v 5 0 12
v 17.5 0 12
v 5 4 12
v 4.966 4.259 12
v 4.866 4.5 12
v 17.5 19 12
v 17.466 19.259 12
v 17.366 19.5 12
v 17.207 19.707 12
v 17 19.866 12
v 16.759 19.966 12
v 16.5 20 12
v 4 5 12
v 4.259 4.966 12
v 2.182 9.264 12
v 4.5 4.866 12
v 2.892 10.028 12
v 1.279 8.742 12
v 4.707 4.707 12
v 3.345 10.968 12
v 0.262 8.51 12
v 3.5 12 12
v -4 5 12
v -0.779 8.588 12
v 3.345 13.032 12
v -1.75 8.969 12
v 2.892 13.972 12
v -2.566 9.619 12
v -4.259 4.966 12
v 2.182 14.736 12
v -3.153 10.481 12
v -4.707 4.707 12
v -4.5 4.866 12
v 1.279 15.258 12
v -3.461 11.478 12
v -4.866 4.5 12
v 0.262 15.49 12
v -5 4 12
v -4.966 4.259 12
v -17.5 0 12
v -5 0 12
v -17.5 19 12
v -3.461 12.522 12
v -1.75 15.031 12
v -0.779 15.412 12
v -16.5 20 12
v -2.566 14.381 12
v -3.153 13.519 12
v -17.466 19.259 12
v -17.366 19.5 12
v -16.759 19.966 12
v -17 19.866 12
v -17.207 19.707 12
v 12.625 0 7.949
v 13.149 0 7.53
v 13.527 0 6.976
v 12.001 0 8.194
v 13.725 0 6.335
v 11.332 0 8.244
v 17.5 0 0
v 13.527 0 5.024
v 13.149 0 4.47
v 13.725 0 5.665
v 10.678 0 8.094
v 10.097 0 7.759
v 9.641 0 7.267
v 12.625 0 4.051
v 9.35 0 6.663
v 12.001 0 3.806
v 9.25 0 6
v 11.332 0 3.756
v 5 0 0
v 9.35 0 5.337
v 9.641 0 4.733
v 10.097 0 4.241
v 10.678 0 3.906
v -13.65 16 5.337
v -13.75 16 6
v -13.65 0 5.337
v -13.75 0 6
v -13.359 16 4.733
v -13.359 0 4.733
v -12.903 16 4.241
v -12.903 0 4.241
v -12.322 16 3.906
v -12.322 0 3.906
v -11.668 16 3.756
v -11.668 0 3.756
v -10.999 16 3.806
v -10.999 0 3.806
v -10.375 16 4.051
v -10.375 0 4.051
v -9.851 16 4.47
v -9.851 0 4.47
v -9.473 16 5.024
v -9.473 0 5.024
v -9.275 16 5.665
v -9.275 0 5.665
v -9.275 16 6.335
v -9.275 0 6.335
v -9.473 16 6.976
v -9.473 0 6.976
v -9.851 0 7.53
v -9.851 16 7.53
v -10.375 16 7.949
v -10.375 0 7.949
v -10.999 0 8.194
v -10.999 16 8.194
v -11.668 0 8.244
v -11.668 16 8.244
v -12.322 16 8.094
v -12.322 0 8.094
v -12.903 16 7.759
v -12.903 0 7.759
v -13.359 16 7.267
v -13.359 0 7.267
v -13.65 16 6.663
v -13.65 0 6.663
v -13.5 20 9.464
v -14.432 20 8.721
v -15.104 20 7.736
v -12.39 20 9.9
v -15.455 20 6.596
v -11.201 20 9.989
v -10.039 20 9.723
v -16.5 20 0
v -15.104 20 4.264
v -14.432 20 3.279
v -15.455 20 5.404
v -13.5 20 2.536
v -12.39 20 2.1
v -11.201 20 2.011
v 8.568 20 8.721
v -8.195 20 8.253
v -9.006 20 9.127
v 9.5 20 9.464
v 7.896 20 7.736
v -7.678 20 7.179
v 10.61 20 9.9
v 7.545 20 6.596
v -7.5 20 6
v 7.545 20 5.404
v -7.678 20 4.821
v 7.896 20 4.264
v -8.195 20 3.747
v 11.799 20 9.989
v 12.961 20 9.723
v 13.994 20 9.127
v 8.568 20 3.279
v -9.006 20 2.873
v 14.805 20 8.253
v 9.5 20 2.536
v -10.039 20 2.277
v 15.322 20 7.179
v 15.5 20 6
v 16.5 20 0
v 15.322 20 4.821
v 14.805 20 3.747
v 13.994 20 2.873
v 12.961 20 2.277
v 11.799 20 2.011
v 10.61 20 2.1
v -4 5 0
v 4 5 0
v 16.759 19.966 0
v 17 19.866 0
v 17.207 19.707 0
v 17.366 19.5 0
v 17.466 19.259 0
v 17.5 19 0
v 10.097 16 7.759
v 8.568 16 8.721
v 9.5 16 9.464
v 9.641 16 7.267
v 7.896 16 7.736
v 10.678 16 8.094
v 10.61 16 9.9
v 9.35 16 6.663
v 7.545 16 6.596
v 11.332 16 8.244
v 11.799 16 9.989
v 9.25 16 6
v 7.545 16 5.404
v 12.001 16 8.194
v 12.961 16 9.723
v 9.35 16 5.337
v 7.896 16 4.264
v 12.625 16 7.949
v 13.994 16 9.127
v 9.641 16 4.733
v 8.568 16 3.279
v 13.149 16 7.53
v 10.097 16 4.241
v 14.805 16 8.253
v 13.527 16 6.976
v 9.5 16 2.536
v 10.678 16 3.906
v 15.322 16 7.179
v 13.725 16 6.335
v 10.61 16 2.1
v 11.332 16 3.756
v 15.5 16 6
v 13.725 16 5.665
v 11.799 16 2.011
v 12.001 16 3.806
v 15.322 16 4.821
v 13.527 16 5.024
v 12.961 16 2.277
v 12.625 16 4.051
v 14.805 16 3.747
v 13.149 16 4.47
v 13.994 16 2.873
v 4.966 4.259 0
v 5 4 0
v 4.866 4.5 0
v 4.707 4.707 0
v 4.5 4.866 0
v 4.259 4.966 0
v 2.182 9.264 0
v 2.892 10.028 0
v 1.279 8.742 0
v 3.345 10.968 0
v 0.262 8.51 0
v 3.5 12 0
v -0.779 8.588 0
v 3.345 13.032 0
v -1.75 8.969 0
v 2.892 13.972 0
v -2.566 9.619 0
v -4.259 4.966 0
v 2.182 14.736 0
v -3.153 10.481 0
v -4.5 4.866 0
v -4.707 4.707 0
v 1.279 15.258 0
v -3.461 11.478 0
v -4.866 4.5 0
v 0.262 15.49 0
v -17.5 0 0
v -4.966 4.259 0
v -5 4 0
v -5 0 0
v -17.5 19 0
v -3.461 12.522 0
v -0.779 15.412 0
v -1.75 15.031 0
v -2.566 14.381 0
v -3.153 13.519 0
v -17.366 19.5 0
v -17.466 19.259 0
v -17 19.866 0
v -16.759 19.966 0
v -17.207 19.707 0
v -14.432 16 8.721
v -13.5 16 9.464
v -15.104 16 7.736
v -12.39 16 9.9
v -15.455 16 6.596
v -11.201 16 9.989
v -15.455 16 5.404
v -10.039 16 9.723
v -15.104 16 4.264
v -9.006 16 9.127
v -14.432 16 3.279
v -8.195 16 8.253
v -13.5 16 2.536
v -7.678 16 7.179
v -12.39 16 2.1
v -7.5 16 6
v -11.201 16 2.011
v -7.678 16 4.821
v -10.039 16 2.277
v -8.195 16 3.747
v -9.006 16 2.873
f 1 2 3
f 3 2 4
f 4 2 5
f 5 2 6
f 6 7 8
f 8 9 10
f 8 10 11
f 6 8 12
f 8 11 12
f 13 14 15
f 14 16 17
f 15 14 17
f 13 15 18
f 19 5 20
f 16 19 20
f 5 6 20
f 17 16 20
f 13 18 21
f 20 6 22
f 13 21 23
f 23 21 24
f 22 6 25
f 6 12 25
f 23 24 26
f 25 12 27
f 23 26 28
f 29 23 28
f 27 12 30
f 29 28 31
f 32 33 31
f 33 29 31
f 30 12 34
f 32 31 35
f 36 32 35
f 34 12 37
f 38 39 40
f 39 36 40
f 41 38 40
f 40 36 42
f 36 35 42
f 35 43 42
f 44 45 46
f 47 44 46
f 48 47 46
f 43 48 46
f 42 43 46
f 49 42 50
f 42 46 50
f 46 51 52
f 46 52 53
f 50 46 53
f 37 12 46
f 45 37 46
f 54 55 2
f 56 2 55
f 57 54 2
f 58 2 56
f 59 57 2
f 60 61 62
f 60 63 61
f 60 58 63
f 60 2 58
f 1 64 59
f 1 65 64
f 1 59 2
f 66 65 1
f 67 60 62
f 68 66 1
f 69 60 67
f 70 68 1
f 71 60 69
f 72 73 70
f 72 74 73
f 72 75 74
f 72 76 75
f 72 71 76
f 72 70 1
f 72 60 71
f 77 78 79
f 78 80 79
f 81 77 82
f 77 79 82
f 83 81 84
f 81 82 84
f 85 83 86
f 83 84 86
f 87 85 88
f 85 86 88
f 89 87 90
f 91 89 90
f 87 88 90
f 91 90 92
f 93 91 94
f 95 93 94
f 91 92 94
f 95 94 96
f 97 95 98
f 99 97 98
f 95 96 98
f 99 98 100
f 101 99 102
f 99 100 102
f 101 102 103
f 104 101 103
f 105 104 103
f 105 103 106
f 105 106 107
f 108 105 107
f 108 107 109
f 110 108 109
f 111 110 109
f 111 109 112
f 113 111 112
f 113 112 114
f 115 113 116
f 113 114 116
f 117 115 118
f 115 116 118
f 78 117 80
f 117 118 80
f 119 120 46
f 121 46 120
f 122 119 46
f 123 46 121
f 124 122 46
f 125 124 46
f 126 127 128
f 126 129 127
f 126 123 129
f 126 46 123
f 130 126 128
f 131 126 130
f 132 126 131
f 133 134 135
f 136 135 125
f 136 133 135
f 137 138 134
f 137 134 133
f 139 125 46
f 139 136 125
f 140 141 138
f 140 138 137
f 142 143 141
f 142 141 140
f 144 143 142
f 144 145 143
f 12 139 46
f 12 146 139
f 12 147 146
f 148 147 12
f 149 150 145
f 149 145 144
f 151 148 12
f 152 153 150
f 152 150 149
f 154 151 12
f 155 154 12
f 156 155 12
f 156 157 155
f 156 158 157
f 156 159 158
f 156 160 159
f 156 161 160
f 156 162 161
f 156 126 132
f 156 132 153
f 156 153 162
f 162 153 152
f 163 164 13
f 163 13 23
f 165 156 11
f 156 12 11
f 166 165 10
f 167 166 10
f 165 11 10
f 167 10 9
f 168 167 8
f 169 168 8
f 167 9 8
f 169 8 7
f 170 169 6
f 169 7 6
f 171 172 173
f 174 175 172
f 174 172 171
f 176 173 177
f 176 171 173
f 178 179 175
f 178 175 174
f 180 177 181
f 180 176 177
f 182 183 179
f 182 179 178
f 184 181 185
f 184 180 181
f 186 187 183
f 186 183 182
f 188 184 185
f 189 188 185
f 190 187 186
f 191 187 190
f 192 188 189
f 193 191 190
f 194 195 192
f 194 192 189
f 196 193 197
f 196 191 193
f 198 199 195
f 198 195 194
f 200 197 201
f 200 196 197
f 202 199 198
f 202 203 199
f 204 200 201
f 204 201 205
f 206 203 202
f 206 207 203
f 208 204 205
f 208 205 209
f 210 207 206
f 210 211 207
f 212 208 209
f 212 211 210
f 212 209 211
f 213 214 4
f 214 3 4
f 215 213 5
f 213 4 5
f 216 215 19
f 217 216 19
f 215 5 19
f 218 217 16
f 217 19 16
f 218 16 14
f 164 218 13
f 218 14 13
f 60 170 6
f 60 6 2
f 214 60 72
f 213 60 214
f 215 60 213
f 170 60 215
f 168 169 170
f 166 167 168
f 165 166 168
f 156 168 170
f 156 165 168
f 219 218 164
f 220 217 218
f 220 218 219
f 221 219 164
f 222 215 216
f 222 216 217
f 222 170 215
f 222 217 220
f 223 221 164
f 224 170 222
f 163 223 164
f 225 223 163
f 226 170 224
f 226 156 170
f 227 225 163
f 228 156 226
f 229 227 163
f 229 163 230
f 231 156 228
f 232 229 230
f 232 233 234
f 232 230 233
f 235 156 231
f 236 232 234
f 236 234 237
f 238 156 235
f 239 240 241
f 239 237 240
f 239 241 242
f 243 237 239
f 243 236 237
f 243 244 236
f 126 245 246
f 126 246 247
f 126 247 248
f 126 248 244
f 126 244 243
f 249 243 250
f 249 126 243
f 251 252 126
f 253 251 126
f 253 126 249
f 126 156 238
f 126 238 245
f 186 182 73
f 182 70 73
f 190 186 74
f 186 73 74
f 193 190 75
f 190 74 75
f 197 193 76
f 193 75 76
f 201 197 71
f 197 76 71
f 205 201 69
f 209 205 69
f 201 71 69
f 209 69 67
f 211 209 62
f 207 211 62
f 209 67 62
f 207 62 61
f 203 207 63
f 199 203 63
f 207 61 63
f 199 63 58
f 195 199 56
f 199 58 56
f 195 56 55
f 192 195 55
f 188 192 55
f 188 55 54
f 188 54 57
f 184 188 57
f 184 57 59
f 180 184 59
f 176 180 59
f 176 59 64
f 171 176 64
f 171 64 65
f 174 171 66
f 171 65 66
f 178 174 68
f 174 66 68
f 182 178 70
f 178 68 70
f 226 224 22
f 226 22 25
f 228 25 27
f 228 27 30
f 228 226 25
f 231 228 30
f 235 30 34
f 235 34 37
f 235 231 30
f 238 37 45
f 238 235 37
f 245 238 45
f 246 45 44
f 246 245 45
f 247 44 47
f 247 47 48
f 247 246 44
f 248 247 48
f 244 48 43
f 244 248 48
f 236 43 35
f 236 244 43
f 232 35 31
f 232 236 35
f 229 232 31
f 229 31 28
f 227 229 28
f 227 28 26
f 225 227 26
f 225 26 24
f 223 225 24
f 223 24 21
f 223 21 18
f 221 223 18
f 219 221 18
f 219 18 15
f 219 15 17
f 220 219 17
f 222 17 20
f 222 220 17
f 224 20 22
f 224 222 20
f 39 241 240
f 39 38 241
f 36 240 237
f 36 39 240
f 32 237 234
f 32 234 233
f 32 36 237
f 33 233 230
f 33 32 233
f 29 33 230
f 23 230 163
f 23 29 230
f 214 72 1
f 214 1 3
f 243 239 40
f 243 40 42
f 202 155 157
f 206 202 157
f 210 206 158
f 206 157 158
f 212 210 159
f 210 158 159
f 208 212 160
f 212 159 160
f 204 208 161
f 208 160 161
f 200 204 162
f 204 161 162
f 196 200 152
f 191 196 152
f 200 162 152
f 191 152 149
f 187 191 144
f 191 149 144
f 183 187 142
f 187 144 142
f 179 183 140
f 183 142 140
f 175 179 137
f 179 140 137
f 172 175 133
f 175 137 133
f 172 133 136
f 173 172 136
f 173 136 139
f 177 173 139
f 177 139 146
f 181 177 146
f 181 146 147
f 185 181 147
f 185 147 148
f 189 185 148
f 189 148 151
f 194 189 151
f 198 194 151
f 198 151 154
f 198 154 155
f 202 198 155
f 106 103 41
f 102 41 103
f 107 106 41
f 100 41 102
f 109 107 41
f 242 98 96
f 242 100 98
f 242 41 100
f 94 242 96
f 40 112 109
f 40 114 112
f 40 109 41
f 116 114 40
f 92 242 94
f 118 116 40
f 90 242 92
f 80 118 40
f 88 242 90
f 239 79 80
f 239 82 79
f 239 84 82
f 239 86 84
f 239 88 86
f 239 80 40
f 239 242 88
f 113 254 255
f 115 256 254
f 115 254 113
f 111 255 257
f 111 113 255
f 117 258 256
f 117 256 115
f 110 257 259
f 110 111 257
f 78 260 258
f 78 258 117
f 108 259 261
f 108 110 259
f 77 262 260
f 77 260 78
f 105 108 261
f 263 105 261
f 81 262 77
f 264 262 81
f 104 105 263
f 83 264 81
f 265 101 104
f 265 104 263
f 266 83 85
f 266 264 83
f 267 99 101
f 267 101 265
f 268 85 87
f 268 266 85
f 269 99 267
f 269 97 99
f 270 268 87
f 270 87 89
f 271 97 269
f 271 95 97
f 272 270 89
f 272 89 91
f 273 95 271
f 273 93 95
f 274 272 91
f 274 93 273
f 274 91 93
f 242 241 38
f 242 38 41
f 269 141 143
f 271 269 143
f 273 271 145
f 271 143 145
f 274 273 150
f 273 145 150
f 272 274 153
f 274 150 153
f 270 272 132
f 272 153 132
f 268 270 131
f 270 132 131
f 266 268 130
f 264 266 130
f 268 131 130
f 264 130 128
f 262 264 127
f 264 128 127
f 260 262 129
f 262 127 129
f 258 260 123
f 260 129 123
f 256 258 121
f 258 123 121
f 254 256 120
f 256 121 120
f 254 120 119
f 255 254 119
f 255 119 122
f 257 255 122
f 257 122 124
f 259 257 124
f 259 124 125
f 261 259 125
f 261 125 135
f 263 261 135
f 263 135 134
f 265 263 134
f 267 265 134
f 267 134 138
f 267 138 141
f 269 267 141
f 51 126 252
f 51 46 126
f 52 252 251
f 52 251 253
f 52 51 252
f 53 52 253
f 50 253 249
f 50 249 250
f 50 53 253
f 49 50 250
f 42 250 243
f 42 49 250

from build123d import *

# Parameters (mm, degrees)
SKETCH1_R                      = 3.5
BOSS_EXTRUDE1_DEPTH            = 12
CBORE_FOR_M4_SHCS1_D           = 4.5
CBORE_FOR_M4_SHCS1_CBORE_D     = 8
CBORE_FOR_M4_SHCS1_CBORE_DEPTH = 4
FILLET1_R                      = 1


with BuildPart() as part:
    # Sketch1 → Boss-Extrude1 (new body)
    with BuildSketch(Plane.XY):
        Polygon((-17.5, 20), (17.5, 20), (17.5, 0), (5, 0), (5, 5), (-5, 5), (-5, 0), (-17.5, 0), align=None)
        with Locations((0, 12)):
            Circle(SKETCH1_R, mode=Mode.SUBTRACT)
    extrude(amount=BOSS_EXTRUDE1_DEPTH)

    # CBORE for M4 SHCS1 (through all)
    with Locations(Plane(origin=(0, 20, 0), x_dir=(1, 0, 0), z_dir=(0, 1, 0))):
        with Locations((-11.5, -6), (11.5, -6)):
            CounterBoreHole(CBORE_FOR_M4_SHCS1_D / 2, CBORE_FOR_M4_SHCS1_CBORE_D / 2, CBORE_FOR_M4_SHCS1_CBORE_DEPTH)

    # Fillet1
    fillet1_edges = [part.edges().sort_by_distance(p)[0] for p in [
        (5, 5, 6),
        (-5, 5, 6),
        (-17.5, 20, 6),
        (17.5, 20, 6),
    ]]
    fillet(fillet1_edges, radius=FILLET1_R)


solid = part.part
